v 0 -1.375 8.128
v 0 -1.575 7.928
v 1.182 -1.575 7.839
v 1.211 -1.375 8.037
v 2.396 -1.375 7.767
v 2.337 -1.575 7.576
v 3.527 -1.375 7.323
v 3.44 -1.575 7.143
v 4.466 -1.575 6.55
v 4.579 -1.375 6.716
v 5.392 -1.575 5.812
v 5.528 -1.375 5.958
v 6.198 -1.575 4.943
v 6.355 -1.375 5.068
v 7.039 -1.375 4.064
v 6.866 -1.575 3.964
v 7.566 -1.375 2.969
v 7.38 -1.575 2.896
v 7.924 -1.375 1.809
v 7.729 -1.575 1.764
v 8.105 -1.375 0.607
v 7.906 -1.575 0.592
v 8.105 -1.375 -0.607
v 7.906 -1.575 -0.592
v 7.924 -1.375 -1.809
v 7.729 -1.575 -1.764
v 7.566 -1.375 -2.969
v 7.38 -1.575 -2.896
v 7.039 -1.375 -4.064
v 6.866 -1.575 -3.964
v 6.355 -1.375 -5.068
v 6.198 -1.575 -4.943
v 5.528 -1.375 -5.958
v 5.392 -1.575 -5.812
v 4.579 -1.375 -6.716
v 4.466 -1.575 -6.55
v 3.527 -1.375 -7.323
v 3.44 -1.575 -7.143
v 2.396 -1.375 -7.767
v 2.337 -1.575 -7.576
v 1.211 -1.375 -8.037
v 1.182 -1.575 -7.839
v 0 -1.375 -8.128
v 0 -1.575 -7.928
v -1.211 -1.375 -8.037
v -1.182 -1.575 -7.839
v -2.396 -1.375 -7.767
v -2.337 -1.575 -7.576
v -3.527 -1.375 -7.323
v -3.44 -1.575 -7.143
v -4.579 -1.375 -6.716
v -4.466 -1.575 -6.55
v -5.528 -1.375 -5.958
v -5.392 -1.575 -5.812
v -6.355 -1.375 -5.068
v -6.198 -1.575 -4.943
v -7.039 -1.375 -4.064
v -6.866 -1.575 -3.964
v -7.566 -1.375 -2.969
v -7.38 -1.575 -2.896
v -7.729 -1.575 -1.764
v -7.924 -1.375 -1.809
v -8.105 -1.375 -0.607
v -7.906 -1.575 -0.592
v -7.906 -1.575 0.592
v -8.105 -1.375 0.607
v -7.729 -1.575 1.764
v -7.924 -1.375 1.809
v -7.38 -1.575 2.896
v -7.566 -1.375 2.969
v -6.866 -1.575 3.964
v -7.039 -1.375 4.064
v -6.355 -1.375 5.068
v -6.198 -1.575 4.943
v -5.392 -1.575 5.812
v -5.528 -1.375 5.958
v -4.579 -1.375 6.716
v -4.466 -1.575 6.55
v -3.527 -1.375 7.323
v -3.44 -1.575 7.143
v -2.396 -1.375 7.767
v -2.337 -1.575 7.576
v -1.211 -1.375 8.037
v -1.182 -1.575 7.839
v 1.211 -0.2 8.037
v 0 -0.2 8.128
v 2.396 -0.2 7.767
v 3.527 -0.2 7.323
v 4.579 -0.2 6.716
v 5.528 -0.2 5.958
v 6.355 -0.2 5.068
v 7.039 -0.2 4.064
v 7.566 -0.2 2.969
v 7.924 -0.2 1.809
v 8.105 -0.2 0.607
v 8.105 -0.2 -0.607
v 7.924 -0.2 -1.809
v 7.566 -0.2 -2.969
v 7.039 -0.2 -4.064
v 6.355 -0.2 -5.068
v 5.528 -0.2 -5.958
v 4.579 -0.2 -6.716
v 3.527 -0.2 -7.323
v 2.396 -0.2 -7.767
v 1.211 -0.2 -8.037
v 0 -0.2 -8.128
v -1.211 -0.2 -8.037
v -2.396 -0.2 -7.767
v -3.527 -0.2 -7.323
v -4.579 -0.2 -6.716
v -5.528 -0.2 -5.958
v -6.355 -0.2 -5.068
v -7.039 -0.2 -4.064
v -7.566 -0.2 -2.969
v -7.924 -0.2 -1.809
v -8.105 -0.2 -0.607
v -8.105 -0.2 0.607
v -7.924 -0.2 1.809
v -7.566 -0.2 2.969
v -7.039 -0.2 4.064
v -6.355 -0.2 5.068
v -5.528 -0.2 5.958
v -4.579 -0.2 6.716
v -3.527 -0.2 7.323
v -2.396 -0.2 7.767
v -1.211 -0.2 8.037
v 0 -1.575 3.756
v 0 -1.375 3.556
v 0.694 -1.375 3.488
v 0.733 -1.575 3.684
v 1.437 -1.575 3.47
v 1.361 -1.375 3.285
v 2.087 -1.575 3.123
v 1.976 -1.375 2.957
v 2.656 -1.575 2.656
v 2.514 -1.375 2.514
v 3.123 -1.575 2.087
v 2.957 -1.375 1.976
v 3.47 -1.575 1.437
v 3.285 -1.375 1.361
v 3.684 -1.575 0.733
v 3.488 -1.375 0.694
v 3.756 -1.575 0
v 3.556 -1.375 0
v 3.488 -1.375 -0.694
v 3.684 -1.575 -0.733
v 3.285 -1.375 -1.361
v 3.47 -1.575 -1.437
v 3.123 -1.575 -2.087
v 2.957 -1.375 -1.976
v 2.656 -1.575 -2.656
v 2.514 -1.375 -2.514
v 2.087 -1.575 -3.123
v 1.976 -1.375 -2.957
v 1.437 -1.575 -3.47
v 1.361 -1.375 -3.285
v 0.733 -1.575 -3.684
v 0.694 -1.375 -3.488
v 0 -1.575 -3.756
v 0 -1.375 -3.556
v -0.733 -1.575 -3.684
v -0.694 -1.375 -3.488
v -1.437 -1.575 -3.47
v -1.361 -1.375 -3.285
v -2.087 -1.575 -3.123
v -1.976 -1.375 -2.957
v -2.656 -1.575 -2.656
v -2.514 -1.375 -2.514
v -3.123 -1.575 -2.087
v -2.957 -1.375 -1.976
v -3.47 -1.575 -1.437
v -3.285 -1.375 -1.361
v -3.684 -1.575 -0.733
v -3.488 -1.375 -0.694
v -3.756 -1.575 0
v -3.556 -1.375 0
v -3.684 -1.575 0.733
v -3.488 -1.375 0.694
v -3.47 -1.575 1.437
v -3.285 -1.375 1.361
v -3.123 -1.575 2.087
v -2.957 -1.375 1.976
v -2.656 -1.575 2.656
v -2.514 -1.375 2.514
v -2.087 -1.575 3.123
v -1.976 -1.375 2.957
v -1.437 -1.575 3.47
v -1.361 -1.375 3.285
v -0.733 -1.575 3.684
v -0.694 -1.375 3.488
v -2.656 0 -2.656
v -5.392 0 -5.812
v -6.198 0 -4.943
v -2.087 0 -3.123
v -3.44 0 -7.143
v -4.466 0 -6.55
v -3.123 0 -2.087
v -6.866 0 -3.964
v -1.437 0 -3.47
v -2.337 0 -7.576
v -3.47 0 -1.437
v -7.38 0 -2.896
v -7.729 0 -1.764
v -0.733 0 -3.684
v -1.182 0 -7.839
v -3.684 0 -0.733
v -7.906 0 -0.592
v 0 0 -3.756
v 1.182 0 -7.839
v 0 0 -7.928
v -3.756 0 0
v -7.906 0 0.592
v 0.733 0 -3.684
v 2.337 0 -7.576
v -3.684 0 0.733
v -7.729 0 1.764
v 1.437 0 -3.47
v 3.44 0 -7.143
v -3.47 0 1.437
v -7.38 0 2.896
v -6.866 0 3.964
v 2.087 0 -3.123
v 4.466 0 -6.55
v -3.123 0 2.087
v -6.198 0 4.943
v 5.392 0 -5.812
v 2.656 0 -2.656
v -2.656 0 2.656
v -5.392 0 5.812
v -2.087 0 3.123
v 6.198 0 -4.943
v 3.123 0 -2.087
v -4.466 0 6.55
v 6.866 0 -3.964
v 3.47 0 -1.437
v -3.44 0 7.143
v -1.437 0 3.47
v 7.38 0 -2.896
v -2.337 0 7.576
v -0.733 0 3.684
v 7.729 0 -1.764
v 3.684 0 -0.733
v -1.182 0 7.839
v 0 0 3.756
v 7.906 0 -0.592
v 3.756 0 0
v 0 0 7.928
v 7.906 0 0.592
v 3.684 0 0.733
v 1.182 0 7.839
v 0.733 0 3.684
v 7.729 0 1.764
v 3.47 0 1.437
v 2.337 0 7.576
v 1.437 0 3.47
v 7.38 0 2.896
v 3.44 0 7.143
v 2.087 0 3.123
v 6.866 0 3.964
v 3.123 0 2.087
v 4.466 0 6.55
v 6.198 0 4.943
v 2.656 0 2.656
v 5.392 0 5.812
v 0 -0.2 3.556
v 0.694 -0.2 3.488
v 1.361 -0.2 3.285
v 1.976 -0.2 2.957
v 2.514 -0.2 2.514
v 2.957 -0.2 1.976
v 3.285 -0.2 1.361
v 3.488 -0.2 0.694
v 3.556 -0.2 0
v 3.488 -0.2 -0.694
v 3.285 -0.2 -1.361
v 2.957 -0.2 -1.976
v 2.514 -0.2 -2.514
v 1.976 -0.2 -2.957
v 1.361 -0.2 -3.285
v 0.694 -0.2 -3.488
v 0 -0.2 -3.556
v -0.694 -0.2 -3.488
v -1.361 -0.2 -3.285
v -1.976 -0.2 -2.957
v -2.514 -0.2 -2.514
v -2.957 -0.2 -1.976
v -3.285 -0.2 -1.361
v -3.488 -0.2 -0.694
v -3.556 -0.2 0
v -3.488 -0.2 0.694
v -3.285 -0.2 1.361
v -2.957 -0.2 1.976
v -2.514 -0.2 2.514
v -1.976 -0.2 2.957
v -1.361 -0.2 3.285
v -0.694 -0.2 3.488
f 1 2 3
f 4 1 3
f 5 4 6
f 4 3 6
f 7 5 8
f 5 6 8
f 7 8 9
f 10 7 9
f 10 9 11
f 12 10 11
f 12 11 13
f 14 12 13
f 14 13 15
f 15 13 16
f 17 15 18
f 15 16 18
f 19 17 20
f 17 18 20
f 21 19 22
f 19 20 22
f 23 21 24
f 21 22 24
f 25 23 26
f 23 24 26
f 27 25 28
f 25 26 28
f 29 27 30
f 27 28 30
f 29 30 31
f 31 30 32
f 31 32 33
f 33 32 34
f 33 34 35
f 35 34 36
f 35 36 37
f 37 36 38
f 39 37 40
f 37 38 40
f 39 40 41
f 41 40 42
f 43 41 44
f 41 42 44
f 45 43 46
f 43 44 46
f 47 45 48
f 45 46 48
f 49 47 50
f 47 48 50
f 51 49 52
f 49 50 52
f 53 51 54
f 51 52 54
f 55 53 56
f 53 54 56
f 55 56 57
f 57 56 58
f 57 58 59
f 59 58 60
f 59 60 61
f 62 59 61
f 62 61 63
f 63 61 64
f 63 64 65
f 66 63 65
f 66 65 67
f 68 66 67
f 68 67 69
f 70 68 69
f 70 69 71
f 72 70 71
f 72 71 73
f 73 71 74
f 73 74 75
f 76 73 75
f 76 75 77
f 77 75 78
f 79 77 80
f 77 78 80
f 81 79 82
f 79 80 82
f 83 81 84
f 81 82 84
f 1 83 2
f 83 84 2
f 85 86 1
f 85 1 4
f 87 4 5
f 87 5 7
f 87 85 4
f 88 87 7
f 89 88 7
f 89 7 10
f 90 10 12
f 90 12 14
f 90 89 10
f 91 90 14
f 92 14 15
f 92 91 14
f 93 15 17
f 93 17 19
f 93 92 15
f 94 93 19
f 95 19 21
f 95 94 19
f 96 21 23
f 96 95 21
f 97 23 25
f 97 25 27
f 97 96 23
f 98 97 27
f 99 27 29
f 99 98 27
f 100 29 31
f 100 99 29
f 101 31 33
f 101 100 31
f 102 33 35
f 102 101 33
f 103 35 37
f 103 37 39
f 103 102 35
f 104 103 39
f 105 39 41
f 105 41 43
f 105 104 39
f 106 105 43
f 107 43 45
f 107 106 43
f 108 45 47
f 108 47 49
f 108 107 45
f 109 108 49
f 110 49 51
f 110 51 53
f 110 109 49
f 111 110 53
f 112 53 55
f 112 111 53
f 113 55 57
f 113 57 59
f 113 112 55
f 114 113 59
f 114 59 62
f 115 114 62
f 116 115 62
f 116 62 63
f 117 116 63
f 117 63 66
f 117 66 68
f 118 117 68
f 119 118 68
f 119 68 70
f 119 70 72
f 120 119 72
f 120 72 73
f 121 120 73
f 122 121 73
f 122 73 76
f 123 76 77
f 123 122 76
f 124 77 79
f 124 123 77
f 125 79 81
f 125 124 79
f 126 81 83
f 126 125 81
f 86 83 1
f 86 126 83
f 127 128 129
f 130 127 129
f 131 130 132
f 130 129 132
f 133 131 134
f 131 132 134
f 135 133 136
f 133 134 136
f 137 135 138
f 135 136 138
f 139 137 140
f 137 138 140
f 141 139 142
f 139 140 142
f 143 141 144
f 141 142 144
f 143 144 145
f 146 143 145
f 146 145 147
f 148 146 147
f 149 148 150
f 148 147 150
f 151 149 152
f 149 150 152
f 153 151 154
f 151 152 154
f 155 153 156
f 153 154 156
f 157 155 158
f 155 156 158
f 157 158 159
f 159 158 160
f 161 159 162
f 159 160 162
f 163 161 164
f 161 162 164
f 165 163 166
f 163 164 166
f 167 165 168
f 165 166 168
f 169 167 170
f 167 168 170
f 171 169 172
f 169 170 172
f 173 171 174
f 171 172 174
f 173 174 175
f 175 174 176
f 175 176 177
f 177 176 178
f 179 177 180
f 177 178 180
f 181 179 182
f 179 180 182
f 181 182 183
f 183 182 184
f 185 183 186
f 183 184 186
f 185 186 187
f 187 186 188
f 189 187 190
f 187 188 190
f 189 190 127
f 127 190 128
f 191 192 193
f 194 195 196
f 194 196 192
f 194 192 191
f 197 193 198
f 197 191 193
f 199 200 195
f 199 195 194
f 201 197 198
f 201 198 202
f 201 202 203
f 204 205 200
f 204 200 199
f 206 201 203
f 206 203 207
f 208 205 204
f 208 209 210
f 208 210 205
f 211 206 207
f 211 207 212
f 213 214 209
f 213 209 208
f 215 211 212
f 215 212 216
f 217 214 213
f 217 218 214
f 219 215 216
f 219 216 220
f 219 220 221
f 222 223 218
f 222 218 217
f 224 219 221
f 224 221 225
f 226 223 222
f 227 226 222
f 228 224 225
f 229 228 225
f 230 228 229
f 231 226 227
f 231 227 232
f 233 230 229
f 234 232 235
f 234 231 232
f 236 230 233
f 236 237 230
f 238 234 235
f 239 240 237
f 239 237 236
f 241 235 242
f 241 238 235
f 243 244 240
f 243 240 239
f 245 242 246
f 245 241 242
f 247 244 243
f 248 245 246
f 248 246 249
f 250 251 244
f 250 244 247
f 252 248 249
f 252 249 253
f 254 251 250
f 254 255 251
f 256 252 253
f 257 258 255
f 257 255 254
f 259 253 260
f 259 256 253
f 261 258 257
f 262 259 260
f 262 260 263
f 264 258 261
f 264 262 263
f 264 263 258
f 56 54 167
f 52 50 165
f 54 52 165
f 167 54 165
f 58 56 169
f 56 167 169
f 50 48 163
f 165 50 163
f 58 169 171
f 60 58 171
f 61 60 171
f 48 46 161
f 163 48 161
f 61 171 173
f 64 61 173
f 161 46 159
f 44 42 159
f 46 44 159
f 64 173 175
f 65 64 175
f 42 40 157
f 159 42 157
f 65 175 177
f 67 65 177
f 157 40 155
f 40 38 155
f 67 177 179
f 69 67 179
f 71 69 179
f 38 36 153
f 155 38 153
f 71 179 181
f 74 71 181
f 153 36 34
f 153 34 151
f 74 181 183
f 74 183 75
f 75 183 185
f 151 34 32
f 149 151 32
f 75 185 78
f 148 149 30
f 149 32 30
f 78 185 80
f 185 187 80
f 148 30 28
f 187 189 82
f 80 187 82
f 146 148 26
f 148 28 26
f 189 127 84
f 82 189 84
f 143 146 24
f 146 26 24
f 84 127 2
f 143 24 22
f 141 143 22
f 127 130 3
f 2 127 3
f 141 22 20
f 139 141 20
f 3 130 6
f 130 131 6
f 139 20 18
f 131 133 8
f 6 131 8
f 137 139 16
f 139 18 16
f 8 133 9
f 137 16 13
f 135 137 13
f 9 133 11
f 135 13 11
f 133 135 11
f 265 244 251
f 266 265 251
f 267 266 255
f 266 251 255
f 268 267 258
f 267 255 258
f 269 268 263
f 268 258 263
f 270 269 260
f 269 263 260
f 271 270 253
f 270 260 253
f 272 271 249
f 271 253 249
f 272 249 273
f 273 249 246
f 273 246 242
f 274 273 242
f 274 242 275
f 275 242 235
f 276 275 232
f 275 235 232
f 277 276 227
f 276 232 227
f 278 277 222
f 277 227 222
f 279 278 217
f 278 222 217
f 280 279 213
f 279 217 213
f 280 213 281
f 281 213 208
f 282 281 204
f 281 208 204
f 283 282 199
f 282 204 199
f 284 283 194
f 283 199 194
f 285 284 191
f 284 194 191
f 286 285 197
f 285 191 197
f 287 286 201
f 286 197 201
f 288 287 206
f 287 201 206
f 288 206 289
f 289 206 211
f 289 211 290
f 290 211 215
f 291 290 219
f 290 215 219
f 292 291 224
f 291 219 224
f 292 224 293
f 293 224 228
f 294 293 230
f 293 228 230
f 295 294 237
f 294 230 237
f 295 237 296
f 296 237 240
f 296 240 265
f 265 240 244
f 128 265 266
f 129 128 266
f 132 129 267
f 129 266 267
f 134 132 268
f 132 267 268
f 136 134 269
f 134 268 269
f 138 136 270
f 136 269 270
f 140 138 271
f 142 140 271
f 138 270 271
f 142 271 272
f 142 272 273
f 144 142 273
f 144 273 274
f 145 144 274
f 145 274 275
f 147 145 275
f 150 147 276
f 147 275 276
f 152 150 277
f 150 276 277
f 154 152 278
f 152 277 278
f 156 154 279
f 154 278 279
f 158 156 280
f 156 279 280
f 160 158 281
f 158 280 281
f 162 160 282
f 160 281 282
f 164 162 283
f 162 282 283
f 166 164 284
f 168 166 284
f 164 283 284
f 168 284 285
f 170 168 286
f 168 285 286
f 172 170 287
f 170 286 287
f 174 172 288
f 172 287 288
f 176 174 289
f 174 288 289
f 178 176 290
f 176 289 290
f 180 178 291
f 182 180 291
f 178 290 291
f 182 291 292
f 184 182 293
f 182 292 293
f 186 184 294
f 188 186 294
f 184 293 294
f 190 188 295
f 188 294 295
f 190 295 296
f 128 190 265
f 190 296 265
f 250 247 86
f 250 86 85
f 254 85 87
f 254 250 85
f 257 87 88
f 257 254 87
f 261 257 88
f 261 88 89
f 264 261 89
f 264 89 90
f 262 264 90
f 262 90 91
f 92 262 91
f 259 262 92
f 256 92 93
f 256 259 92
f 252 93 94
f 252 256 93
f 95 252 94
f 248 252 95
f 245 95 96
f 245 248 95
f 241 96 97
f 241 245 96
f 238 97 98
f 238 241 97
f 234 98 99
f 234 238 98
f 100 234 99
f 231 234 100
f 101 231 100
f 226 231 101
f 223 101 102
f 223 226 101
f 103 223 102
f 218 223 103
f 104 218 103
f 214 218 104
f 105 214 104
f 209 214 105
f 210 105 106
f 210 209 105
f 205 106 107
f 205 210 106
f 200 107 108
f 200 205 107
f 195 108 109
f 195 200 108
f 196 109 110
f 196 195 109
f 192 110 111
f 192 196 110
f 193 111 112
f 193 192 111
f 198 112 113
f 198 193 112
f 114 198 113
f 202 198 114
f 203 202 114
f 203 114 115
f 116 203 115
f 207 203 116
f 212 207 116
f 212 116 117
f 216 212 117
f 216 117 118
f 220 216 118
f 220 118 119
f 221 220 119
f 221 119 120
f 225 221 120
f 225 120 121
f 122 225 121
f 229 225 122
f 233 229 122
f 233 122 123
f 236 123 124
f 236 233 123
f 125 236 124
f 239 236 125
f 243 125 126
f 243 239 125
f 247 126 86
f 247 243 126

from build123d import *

# Parameters (mm, degrees)
SKETCH1_W     = 4.572
SKETCH1_H     = 1.5748
CHAMFER1_SIZE = 0.2


with BuildPart() as part:
    # Sketch1 → Revolve1 (revolve)
    with BuildSketch(Plane(origin=(0, 0, 0), x_dir=(-1, 0, 0), z_dir=(0, 0, -1)), mode=Mode.PRIVATE) as revolve1_sk:
        with Locations((-5.842, -0.7874)):
            Rectangle(SKETCH1_W, SKETCH1_H)
    revolve(revolve1_sk.sketch.rotate(Axis((0, -1.5748, 0), (0, 1, 0)), 270), axis=Axis((0, -1.5748, 0), (0, 1, 0)))

    # Chamfer1
    chamfer1_edges = [part.edges().sort_by_distance(p)[0] for p in [
        (0, 0, -3.556),
        (0, -1.5748, -3.556),
        (0, -1.5748, -8.128),
        (0, 0, -8.128),
    ]]
    chamfer(chamfer1_edges, length=CHAMFER1_SIZE)


solid = part.part
